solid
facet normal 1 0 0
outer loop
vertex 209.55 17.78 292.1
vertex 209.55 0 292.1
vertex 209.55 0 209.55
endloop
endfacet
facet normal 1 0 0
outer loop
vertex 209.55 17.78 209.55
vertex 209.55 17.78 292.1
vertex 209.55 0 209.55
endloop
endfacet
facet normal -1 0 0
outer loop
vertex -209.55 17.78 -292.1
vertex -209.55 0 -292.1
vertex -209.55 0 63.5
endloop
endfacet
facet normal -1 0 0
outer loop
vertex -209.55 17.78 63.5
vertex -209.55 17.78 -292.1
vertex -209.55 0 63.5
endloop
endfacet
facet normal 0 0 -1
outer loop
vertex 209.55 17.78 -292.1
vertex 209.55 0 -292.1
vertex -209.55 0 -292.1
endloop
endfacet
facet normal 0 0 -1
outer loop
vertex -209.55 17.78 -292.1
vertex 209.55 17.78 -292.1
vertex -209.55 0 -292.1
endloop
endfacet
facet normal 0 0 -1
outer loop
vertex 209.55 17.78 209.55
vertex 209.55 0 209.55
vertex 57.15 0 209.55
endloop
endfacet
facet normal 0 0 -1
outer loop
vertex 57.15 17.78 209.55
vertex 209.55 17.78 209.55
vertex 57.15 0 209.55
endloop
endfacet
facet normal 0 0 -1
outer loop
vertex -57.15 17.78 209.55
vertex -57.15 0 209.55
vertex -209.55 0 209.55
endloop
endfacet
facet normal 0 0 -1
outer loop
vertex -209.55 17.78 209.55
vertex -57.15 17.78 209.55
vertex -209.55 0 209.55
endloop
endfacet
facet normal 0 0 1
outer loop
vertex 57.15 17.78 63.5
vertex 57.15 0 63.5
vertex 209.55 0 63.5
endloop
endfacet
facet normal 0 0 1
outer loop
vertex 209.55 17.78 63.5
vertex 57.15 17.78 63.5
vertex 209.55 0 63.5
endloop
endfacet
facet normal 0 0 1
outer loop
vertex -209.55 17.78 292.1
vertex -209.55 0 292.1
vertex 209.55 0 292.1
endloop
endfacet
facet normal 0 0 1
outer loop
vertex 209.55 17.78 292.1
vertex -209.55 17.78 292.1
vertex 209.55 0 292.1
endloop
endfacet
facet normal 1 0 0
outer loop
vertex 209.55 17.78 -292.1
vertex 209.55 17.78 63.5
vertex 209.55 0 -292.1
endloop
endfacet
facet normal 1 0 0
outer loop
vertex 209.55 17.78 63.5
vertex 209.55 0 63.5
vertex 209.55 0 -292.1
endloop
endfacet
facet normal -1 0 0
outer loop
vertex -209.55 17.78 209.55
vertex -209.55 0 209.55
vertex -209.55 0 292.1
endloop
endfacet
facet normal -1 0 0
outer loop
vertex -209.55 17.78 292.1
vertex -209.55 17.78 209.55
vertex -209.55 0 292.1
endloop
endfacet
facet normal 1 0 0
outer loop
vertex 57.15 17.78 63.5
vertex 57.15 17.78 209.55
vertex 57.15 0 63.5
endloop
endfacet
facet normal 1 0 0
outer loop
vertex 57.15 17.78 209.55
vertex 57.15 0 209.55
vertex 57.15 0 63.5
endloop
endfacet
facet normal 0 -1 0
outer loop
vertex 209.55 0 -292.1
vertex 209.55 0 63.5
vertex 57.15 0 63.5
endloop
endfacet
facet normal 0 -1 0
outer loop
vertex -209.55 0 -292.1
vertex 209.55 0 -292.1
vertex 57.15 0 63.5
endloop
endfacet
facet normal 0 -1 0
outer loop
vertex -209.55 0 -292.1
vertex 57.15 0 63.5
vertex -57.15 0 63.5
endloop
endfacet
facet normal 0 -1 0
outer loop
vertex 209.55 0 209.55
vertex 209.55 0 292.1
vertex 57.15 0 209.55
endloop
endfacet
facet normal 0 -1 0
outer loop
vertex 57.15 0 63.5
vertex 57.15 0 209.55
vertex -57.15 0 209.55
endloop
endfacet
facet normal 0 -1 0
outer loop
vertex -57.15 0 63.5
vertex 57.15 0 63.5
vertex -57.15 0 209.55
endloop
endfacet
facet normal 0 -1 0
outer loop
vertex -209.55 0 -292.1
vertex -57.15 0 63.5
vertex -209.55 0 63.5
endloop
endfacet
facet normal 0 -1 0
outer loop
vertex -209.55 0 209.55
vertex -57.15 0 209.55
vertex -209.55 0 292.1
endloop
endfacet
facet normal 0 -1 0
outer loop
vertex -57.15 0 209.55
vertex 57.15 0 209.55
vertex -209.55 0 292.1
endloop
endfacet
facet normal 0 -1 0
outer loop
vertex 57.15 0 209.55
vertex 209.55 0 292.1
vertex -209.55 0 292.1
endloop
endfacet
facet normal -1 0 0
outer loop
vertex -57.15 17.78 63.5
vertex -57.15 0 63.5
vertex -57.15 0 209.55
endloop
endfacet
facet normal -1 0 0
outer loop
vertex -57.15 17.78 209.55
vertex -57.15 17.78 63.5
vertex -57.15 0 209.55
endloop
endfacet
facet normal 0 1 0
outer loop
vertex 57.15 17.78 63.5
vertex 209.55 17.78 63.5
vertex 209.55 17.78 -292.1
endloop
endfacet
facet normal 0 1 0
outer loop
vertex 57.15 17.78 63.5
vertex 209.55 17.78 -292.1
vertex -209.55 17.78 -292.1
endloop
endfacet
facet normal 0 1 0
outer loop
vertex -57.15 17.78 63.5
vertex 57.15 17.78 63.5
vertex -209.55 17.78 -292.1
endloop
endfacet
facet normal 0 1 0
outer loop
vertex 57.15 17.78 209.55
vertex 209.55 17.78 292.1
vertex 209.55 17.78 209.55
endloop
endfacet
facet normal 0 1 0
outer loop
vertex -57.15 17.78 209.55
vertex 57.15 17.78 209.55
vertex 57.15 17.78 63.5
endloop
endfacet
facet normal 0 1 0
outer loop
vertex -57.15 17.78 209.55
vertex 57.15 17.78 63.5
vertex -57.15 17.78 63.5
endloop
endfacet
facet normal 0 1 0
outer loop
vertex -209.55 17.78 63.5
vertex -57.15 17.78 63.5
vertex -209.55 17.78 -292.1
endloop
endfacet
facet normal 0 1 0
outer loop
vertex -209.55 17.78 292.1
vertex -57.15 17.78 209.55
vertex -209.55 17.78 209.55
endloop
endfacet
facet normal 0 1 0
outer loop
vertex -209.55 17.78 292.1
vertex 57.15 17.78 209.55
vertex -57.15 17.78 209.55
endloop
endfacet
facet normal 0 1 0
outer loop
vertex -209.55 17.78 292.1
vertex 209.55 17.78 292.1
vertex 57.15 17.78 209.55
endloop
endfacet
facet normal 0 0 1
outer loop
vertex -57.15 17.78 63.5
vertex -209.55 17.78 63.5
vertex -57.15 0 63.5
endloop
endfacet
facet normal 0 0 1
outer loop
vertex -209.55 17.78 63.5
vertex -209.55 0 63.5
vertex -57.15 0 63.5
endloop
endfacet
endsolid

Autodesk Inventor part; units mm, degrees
ref_plane "XZ Plane" through (0, 0, 0) normal (0, 1, 0) x (-1, 0, 0)
ref_plane "XY Plane" through (0, 0, 0) normal (0, 0, 1) x (1, 0, 0)
sketch "Sketch1" plane through (0, 0, 0) normal (0, 1, 0) x (-1, 0, 0)
  line L0 (-209.55, 292.1) -> (-209.55, -292.1)
  line L1 (-209.55, -292.1) -> (209.55, -292.1)
  line L2 (209.55, -292.1) -> (209.55, 292.1)
  line L3 (209.55, 292.1) -> (-209.55, 292.1)
  line L4 (-209.55, 292.1) -> (209.55, -292.1) construction
  line L5 (-209.55, -292.1) -> (209.55, 292.1) construction
  point P0 (0, 0)
  dimension "baseLength" = 584.2
  dimension "baseWidth" = 419.1
extrude "Extrusion1" add sketch "Sketch1" along normal blind 17.78
sketch "Sketch2" plane through (0, 0, 0) normal (0, -1, 0) x (1, 0, 0)
  line L0 (209.55, 292.1) -> (209.55, -292.1) projected
  line L1 (209.55, 209.55) -> (57.15, 209.55)
  line L2 (57.15, 209.55) -> (57.15, 63.5)
  line L3 (57.15, 63.5) -> (209.55, 63.5)
  line L4 (209.55, 63.5) -> (209.55, 209.55)
  line L5 (-209.55, 292.1) -> (209.55, 292.1) projected
  point P0 (0, 0)
  dimension "backToEndOfGearBox" = 82.55
  dimension "backToFrontOfGearBox" = 228.6
  dimension "wdithForGearBox" = 152.4
extrude "Extrusion2" cut sketch "Sketch2" against normal through all
mirror "Mirror1" about plane through (0, 0, 0) normal (1, 0, 0) of "Extrusion2"
equation "\"baseLength\" = userBaseLength"
equation "\"baseWidth\" = userBaseWidth"
equation "\"spaceingAlongSides\" = 3.175"
equation "\"distanceFromBackForEndBolt\" = 38.1"
equation "\"spacingForBolt\" = 25.4"
equation "\"widthOfSpacingForBolt\" = 12.7"
equation "\"lengthOfSpacingForBolt\" = 25.4"
equation "\"userBaseWidth\" = 419.1"
equation "\"userBaseLength\" = 584.2"
properties part number "RhinoBottomFloorPlate05" material "Wood (Birch)"
